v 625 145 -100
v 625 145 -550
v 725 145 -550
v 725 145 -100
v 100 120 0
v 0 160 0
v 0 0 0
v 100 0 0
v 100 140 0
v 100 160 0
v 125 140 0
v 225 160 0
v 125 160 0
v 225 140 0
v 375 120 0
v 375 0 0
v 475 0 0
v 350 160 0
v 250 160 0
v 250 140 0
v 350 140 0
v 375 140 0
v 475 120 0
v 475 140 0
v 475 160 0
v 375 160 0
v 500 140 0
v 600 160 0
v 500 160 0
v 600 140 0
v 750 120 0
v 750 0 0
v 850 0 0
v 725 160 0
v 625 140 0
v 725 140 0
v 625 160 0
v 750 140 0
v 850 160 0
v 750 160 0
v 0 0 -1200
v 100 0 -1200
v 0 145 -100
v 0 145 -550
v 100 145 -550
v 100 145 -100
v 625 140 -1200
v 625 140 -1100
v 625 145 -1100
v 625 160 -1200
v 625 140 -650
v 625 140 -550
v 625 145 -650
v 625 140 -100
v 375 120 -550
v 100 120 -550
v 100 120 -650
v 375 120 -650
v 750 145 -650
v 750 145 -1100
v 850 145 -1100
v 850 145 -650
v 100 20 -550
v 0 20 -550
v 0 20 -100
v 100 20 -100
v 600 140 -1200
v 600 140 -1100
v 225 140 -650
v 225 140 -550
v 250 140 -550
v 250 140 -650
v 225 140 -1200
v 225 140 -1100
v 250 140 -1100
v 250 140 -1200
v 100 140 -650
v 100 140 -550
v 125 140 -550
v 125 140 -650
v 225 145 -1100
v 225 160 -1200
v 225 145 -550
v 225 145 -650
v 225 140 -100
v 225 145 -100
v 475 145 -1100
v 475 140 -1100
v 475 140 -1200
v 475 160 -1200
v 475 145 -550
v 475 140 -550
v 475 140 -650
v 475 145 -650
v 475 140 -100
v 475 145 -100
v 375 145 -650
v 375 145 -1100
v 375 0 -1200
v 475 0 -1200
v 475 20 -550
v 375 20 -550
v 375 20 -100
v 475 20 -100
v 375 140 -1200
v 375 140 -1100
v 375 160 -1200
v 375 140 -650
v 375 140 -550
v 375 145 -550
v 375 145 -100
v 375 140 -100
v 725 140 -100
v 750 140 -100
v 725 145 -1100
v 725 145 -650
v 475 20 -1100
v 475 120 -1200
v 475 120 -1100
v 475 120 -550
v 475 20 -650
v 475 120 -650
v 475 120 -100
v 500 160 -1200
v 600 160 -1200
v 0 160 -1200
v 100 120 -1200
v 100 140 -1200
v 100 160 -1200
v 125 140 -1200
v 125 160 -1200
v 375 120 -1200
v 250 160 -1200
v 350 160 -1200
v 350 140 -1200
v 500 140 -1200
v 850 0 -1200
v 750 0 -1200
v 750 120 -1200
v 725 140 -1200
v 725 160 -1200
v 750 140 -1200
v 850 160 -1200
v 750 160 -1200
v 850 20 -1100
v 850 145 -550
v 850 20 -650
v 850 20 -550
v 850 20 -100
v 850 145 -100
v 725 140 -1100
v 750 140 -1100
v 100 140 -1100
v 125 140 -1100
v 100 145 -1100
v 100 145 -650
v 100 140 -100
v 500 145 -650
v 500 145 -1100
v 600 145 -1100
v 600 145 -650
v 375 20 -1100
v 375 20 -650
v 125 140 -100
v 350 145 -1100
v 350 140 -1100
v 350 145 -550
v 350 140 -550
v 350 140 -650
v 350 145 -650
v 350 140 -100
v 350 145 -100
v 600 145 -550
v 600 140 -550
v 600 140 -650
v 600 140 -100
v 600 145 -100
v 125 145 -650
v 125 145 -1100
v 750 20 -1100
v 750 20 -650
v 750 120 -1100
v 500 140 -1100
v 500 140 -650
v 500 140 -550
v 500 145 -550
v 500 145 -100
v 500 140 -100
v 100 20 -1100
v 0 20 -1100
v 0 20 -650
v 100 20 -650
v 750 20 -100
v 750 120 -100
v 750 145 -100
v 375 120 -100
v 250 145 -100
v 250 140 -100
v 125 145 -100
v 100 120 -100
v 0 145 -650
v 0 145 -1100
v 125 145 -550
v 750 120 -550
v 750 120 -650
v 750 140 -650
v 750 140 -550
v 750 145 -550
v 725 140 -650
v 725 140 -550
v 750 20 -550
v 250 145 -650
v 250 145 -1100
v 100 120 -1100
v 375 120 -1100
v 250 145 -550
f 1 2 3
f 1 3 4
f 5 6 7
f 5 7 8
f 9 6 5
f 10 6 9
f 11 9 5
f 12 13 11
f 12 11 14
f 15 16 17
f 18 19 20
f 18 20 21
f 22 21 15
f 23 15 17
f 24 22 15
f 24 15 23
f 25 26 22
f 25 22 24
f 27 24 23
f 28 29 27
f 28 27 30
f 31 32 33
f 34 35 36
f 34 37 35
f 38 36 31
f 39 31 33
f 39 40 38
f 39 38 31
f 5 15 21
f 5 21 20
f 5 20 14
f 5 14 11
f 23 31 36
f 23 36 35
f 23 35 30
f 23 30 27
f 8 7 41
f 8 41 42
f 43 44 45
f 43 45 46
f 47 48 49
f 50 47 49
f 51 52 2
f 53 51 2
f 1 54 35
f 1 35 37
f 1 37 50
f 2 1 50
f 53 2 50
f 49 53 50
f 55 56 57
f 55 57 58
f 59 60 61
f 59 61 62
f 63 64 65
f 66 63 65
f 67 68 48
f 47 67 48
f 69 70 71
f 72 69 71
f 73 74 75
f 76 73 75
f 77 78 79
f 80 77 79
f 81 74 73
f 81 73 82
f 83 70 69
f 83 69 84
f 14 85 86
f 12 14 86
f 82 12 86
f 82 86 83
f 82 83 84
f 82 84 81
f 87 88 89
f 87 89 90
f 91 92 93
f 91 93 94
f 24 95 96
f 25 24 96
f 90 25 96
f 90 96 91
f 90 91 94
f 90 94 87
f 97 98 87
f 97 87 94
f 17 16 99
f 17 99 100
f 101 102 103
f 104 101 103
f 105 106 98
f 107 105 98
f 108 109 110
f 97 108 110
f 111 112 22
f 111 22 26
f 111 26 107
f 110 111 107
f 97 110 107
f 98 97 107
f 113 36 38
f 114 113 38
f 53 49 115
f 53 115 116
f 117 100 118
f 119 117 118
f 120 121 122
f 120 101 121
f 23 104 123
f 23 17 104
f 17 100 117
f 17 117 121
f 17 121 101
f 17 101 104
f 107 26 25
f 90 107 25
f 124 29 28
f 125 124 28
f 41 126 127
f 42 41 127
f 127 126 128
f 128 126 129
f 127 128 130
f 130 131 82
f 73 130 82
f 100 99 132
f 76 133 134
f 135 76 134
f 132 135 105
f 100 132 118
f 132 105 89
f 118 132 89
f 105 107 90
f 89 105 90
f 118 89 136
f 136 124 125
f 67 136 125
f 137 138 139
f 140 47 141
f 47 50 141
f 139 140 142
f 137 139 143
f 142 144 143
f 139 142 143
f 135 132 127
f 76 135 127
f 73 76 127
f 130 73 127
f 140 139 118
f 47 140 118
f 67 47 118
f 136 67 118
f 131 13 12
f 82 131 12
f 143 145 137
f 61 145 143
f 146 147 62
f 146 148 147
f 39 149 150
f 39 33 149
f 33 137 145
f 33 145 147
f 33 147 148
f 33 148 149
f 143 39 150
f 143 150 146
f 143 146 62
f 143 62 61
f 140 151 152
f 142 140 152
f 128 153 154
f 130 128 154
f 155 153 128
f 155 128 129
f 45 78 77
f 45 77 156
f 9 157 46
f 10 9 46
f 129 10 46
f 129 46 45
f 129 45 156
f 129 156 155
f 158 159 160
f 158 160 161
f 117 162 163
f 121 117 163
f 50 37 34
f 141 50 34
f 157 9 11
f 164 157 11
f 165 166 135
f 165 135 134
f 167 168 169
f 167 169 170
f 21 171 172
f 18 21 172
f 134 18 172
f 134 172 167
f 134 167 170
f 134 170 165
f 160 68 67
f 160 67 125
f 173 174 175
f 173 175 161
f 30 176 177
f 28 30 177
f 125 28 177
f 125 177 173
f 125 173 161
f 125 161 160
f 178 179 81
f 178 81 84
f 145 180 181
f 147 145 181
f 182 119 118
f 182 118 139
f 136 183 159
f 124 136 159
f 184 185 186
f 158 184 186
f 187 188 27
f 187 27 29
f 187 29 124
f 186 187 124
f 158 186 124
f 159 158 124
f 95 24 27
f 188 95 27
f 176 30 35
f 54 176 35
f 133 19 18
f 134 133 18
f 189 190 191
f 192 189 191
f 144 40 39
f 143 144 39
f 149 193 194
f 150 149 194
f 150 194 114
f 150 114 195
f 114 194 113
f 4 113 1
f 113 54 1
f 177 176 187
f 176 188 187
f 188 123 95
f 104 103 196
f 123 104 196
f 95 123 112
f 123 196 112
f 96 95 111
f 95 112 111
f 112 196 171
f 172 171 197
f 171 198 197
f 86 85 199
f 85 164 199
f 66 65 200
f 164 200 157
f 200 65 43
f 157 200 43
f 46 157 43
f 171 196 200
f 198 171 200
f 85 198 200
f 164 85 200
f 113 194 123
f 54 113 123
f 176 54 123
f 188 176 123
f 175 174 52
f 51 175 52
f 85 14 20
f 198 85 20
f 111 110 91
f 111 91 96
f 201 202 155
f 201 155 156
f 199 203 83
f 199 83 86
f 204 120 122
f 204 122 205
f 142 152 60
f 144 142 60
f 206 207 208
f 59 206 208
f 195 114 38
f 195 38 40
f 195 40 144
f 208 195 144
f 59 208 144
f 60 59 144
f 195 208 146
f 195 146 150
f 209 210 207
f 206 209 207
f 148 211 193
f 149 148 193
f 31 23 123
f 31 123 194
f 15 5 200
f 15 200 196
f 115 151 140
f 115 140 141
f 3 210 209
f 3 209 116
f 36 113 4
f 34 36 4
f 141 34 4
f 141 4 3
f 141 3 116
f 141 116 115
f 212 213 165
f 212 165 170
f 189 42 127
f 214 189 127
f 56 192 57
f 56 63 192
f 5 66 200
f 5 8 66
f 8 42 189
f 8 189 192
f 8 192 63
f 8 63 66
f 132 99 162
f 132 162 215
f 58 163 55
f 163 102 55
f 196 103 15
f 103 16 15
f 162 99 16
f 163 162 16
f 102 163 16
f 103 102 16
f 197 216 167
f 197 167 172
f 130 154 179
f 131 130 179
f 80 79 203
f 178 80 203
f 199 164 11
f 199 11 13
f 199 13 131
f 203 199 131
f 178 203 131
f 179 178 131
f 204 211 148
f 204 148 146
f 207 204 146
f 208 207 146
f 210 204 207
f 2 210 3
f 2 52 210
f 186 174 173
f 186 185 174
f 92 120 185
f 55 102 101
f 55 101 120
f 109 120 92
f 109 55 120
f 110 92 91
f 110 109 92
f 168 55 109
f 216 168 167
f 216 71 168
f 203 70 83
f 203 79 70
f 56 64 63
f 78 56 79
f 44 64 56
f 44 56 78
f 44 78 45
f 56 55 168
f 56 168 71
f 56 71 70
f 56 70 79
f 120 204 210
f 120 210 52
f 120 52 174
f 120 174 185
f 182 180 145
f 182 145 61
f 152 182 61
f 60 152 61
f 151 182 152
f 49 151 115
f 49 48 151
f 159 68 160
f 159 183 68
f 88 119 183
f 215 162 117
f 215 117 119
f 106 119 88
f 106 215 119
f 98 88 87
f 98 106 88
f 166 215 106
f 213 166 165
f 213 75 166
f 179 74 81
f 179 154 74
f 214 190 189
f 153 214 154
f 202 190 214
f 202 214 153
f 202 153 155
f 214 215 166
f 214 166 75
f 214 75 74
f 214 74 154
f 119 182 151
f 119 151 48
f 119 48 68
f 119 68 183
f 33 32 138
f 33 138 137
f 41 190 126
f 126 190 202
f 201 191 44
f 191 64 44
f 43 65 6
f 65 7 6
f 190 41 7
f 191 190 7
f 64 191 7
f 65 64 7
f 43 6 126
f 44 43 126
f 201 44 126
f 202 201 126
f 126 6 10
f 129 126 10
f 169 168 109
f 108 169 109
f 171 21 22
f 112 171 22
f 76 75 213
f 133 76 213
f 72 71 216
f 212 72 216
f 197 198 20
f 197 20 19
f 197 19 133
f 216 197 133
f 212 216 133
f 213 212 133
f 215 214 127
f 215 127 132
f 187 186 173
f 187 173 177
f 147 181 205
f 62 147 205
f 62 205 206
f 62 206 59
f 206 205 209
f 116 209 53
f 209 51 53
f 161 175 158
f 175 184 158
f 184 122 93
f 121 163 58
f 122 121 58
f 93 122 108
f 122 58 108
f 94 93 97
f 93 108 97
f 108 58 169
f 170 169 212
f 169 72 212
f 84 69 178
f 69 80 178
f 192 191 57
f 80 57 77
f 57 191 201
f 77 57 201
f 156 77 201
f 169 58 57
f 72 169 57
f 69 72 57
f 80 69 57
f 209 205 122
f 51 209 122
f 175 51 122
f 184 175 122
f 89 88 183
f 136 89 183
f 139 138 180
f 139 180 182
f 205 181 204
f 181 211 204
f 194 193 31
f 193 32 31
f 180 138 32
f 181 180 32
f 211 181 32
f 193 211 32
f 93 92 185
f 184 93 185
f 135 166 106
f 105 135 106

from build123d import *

# Parameters (mm, degrees)
SKETCH1_W           = 850
SKETCH1_H           = 160
BOSS_EXTRUDE1_DEPTH = 1200
SKETCH2_W           = 275
SKETCH2_H           = 120
CUT_EXTRUDE1_DEPTH  = 1480.222768889
SKETCH3_W           = 450
SKETCH3_H           = 125
CUT_EXTRUDE2_DEPTH  = 1480.222768889
SKETCH4_W           = 25
SKETCH4_H           = 20
CUT_EXTRUDE3_DEPTH  = 1480.222768889


with BuildPart() as part:
    # Sketch1 → Boss-Extrude1 (new body)
    with BuildSketch(Plane.XY):
        with Locations((425, 80)):
            Rectangle(SKETCH1_W, SKETCH1_H)
    extrude(amount=-BOSS_EXTRUDE1_DEPTH)

    # Sketch2 → Cut-Extrude1 (cut, through all)
    with BuildSketch(Plane.XY):
        with Locations((237.5, 60)):
            Rectangle(SKETCH2_W, SKETCH2_H)
        with Locations((612.5, 60)):
            Rectangle(SKETCH2_W, SKETCH2_H)
    extrude(amount=-CUT_EXTRUDE1_DEPTH, mode=Mode.SUBTRACT)

    # Sketch3 → Cut-Extrude2 (cut, through all)
    with BuildSketch(Plane.ZY):
        with Locations((-875, 82.5)):
            Rectangle(SKETCH3_W, SKETCH3_H)
        with Locations((-325, 82.5)):
            Rectangle(SKETCH3_W, SKETCH3_H)
    extrude(amount=-CUT_EXTRUDE2_DEPTH, mode=Mode.SUBTRACT)

    # Sketch4 → Cut-Extrude3 (cut, through all)
    with BuildSketch(Plane.XY):
        with Locations((112.5, 150)):
            Rectangle(SKETCH4_W, SKETCH4_H)
        with Locations((237.5, 150)):
            Rectangle(SKETCH4_W, SKETCH4_H)
        with Locations((362.5, 150)):
            Rectangle(SKETCH4_W, SKETCH4_H)
        with Locations((487.5, 150)):
            Rectangle(SKETCH4_W, SKETCH4_H)
        with Locations((612.5, 150)):
            Rectangle(SKETCH4_W, SKETCH4_H)
        with Locations((737.5, 150)):
            Rectangle(SKETCH4_W, SKETCH4_H)
    extrude(amount=-CUT_EXTRUDE3_DEPTH, mode=Mode.SUBTRACT)


solid = part.part
